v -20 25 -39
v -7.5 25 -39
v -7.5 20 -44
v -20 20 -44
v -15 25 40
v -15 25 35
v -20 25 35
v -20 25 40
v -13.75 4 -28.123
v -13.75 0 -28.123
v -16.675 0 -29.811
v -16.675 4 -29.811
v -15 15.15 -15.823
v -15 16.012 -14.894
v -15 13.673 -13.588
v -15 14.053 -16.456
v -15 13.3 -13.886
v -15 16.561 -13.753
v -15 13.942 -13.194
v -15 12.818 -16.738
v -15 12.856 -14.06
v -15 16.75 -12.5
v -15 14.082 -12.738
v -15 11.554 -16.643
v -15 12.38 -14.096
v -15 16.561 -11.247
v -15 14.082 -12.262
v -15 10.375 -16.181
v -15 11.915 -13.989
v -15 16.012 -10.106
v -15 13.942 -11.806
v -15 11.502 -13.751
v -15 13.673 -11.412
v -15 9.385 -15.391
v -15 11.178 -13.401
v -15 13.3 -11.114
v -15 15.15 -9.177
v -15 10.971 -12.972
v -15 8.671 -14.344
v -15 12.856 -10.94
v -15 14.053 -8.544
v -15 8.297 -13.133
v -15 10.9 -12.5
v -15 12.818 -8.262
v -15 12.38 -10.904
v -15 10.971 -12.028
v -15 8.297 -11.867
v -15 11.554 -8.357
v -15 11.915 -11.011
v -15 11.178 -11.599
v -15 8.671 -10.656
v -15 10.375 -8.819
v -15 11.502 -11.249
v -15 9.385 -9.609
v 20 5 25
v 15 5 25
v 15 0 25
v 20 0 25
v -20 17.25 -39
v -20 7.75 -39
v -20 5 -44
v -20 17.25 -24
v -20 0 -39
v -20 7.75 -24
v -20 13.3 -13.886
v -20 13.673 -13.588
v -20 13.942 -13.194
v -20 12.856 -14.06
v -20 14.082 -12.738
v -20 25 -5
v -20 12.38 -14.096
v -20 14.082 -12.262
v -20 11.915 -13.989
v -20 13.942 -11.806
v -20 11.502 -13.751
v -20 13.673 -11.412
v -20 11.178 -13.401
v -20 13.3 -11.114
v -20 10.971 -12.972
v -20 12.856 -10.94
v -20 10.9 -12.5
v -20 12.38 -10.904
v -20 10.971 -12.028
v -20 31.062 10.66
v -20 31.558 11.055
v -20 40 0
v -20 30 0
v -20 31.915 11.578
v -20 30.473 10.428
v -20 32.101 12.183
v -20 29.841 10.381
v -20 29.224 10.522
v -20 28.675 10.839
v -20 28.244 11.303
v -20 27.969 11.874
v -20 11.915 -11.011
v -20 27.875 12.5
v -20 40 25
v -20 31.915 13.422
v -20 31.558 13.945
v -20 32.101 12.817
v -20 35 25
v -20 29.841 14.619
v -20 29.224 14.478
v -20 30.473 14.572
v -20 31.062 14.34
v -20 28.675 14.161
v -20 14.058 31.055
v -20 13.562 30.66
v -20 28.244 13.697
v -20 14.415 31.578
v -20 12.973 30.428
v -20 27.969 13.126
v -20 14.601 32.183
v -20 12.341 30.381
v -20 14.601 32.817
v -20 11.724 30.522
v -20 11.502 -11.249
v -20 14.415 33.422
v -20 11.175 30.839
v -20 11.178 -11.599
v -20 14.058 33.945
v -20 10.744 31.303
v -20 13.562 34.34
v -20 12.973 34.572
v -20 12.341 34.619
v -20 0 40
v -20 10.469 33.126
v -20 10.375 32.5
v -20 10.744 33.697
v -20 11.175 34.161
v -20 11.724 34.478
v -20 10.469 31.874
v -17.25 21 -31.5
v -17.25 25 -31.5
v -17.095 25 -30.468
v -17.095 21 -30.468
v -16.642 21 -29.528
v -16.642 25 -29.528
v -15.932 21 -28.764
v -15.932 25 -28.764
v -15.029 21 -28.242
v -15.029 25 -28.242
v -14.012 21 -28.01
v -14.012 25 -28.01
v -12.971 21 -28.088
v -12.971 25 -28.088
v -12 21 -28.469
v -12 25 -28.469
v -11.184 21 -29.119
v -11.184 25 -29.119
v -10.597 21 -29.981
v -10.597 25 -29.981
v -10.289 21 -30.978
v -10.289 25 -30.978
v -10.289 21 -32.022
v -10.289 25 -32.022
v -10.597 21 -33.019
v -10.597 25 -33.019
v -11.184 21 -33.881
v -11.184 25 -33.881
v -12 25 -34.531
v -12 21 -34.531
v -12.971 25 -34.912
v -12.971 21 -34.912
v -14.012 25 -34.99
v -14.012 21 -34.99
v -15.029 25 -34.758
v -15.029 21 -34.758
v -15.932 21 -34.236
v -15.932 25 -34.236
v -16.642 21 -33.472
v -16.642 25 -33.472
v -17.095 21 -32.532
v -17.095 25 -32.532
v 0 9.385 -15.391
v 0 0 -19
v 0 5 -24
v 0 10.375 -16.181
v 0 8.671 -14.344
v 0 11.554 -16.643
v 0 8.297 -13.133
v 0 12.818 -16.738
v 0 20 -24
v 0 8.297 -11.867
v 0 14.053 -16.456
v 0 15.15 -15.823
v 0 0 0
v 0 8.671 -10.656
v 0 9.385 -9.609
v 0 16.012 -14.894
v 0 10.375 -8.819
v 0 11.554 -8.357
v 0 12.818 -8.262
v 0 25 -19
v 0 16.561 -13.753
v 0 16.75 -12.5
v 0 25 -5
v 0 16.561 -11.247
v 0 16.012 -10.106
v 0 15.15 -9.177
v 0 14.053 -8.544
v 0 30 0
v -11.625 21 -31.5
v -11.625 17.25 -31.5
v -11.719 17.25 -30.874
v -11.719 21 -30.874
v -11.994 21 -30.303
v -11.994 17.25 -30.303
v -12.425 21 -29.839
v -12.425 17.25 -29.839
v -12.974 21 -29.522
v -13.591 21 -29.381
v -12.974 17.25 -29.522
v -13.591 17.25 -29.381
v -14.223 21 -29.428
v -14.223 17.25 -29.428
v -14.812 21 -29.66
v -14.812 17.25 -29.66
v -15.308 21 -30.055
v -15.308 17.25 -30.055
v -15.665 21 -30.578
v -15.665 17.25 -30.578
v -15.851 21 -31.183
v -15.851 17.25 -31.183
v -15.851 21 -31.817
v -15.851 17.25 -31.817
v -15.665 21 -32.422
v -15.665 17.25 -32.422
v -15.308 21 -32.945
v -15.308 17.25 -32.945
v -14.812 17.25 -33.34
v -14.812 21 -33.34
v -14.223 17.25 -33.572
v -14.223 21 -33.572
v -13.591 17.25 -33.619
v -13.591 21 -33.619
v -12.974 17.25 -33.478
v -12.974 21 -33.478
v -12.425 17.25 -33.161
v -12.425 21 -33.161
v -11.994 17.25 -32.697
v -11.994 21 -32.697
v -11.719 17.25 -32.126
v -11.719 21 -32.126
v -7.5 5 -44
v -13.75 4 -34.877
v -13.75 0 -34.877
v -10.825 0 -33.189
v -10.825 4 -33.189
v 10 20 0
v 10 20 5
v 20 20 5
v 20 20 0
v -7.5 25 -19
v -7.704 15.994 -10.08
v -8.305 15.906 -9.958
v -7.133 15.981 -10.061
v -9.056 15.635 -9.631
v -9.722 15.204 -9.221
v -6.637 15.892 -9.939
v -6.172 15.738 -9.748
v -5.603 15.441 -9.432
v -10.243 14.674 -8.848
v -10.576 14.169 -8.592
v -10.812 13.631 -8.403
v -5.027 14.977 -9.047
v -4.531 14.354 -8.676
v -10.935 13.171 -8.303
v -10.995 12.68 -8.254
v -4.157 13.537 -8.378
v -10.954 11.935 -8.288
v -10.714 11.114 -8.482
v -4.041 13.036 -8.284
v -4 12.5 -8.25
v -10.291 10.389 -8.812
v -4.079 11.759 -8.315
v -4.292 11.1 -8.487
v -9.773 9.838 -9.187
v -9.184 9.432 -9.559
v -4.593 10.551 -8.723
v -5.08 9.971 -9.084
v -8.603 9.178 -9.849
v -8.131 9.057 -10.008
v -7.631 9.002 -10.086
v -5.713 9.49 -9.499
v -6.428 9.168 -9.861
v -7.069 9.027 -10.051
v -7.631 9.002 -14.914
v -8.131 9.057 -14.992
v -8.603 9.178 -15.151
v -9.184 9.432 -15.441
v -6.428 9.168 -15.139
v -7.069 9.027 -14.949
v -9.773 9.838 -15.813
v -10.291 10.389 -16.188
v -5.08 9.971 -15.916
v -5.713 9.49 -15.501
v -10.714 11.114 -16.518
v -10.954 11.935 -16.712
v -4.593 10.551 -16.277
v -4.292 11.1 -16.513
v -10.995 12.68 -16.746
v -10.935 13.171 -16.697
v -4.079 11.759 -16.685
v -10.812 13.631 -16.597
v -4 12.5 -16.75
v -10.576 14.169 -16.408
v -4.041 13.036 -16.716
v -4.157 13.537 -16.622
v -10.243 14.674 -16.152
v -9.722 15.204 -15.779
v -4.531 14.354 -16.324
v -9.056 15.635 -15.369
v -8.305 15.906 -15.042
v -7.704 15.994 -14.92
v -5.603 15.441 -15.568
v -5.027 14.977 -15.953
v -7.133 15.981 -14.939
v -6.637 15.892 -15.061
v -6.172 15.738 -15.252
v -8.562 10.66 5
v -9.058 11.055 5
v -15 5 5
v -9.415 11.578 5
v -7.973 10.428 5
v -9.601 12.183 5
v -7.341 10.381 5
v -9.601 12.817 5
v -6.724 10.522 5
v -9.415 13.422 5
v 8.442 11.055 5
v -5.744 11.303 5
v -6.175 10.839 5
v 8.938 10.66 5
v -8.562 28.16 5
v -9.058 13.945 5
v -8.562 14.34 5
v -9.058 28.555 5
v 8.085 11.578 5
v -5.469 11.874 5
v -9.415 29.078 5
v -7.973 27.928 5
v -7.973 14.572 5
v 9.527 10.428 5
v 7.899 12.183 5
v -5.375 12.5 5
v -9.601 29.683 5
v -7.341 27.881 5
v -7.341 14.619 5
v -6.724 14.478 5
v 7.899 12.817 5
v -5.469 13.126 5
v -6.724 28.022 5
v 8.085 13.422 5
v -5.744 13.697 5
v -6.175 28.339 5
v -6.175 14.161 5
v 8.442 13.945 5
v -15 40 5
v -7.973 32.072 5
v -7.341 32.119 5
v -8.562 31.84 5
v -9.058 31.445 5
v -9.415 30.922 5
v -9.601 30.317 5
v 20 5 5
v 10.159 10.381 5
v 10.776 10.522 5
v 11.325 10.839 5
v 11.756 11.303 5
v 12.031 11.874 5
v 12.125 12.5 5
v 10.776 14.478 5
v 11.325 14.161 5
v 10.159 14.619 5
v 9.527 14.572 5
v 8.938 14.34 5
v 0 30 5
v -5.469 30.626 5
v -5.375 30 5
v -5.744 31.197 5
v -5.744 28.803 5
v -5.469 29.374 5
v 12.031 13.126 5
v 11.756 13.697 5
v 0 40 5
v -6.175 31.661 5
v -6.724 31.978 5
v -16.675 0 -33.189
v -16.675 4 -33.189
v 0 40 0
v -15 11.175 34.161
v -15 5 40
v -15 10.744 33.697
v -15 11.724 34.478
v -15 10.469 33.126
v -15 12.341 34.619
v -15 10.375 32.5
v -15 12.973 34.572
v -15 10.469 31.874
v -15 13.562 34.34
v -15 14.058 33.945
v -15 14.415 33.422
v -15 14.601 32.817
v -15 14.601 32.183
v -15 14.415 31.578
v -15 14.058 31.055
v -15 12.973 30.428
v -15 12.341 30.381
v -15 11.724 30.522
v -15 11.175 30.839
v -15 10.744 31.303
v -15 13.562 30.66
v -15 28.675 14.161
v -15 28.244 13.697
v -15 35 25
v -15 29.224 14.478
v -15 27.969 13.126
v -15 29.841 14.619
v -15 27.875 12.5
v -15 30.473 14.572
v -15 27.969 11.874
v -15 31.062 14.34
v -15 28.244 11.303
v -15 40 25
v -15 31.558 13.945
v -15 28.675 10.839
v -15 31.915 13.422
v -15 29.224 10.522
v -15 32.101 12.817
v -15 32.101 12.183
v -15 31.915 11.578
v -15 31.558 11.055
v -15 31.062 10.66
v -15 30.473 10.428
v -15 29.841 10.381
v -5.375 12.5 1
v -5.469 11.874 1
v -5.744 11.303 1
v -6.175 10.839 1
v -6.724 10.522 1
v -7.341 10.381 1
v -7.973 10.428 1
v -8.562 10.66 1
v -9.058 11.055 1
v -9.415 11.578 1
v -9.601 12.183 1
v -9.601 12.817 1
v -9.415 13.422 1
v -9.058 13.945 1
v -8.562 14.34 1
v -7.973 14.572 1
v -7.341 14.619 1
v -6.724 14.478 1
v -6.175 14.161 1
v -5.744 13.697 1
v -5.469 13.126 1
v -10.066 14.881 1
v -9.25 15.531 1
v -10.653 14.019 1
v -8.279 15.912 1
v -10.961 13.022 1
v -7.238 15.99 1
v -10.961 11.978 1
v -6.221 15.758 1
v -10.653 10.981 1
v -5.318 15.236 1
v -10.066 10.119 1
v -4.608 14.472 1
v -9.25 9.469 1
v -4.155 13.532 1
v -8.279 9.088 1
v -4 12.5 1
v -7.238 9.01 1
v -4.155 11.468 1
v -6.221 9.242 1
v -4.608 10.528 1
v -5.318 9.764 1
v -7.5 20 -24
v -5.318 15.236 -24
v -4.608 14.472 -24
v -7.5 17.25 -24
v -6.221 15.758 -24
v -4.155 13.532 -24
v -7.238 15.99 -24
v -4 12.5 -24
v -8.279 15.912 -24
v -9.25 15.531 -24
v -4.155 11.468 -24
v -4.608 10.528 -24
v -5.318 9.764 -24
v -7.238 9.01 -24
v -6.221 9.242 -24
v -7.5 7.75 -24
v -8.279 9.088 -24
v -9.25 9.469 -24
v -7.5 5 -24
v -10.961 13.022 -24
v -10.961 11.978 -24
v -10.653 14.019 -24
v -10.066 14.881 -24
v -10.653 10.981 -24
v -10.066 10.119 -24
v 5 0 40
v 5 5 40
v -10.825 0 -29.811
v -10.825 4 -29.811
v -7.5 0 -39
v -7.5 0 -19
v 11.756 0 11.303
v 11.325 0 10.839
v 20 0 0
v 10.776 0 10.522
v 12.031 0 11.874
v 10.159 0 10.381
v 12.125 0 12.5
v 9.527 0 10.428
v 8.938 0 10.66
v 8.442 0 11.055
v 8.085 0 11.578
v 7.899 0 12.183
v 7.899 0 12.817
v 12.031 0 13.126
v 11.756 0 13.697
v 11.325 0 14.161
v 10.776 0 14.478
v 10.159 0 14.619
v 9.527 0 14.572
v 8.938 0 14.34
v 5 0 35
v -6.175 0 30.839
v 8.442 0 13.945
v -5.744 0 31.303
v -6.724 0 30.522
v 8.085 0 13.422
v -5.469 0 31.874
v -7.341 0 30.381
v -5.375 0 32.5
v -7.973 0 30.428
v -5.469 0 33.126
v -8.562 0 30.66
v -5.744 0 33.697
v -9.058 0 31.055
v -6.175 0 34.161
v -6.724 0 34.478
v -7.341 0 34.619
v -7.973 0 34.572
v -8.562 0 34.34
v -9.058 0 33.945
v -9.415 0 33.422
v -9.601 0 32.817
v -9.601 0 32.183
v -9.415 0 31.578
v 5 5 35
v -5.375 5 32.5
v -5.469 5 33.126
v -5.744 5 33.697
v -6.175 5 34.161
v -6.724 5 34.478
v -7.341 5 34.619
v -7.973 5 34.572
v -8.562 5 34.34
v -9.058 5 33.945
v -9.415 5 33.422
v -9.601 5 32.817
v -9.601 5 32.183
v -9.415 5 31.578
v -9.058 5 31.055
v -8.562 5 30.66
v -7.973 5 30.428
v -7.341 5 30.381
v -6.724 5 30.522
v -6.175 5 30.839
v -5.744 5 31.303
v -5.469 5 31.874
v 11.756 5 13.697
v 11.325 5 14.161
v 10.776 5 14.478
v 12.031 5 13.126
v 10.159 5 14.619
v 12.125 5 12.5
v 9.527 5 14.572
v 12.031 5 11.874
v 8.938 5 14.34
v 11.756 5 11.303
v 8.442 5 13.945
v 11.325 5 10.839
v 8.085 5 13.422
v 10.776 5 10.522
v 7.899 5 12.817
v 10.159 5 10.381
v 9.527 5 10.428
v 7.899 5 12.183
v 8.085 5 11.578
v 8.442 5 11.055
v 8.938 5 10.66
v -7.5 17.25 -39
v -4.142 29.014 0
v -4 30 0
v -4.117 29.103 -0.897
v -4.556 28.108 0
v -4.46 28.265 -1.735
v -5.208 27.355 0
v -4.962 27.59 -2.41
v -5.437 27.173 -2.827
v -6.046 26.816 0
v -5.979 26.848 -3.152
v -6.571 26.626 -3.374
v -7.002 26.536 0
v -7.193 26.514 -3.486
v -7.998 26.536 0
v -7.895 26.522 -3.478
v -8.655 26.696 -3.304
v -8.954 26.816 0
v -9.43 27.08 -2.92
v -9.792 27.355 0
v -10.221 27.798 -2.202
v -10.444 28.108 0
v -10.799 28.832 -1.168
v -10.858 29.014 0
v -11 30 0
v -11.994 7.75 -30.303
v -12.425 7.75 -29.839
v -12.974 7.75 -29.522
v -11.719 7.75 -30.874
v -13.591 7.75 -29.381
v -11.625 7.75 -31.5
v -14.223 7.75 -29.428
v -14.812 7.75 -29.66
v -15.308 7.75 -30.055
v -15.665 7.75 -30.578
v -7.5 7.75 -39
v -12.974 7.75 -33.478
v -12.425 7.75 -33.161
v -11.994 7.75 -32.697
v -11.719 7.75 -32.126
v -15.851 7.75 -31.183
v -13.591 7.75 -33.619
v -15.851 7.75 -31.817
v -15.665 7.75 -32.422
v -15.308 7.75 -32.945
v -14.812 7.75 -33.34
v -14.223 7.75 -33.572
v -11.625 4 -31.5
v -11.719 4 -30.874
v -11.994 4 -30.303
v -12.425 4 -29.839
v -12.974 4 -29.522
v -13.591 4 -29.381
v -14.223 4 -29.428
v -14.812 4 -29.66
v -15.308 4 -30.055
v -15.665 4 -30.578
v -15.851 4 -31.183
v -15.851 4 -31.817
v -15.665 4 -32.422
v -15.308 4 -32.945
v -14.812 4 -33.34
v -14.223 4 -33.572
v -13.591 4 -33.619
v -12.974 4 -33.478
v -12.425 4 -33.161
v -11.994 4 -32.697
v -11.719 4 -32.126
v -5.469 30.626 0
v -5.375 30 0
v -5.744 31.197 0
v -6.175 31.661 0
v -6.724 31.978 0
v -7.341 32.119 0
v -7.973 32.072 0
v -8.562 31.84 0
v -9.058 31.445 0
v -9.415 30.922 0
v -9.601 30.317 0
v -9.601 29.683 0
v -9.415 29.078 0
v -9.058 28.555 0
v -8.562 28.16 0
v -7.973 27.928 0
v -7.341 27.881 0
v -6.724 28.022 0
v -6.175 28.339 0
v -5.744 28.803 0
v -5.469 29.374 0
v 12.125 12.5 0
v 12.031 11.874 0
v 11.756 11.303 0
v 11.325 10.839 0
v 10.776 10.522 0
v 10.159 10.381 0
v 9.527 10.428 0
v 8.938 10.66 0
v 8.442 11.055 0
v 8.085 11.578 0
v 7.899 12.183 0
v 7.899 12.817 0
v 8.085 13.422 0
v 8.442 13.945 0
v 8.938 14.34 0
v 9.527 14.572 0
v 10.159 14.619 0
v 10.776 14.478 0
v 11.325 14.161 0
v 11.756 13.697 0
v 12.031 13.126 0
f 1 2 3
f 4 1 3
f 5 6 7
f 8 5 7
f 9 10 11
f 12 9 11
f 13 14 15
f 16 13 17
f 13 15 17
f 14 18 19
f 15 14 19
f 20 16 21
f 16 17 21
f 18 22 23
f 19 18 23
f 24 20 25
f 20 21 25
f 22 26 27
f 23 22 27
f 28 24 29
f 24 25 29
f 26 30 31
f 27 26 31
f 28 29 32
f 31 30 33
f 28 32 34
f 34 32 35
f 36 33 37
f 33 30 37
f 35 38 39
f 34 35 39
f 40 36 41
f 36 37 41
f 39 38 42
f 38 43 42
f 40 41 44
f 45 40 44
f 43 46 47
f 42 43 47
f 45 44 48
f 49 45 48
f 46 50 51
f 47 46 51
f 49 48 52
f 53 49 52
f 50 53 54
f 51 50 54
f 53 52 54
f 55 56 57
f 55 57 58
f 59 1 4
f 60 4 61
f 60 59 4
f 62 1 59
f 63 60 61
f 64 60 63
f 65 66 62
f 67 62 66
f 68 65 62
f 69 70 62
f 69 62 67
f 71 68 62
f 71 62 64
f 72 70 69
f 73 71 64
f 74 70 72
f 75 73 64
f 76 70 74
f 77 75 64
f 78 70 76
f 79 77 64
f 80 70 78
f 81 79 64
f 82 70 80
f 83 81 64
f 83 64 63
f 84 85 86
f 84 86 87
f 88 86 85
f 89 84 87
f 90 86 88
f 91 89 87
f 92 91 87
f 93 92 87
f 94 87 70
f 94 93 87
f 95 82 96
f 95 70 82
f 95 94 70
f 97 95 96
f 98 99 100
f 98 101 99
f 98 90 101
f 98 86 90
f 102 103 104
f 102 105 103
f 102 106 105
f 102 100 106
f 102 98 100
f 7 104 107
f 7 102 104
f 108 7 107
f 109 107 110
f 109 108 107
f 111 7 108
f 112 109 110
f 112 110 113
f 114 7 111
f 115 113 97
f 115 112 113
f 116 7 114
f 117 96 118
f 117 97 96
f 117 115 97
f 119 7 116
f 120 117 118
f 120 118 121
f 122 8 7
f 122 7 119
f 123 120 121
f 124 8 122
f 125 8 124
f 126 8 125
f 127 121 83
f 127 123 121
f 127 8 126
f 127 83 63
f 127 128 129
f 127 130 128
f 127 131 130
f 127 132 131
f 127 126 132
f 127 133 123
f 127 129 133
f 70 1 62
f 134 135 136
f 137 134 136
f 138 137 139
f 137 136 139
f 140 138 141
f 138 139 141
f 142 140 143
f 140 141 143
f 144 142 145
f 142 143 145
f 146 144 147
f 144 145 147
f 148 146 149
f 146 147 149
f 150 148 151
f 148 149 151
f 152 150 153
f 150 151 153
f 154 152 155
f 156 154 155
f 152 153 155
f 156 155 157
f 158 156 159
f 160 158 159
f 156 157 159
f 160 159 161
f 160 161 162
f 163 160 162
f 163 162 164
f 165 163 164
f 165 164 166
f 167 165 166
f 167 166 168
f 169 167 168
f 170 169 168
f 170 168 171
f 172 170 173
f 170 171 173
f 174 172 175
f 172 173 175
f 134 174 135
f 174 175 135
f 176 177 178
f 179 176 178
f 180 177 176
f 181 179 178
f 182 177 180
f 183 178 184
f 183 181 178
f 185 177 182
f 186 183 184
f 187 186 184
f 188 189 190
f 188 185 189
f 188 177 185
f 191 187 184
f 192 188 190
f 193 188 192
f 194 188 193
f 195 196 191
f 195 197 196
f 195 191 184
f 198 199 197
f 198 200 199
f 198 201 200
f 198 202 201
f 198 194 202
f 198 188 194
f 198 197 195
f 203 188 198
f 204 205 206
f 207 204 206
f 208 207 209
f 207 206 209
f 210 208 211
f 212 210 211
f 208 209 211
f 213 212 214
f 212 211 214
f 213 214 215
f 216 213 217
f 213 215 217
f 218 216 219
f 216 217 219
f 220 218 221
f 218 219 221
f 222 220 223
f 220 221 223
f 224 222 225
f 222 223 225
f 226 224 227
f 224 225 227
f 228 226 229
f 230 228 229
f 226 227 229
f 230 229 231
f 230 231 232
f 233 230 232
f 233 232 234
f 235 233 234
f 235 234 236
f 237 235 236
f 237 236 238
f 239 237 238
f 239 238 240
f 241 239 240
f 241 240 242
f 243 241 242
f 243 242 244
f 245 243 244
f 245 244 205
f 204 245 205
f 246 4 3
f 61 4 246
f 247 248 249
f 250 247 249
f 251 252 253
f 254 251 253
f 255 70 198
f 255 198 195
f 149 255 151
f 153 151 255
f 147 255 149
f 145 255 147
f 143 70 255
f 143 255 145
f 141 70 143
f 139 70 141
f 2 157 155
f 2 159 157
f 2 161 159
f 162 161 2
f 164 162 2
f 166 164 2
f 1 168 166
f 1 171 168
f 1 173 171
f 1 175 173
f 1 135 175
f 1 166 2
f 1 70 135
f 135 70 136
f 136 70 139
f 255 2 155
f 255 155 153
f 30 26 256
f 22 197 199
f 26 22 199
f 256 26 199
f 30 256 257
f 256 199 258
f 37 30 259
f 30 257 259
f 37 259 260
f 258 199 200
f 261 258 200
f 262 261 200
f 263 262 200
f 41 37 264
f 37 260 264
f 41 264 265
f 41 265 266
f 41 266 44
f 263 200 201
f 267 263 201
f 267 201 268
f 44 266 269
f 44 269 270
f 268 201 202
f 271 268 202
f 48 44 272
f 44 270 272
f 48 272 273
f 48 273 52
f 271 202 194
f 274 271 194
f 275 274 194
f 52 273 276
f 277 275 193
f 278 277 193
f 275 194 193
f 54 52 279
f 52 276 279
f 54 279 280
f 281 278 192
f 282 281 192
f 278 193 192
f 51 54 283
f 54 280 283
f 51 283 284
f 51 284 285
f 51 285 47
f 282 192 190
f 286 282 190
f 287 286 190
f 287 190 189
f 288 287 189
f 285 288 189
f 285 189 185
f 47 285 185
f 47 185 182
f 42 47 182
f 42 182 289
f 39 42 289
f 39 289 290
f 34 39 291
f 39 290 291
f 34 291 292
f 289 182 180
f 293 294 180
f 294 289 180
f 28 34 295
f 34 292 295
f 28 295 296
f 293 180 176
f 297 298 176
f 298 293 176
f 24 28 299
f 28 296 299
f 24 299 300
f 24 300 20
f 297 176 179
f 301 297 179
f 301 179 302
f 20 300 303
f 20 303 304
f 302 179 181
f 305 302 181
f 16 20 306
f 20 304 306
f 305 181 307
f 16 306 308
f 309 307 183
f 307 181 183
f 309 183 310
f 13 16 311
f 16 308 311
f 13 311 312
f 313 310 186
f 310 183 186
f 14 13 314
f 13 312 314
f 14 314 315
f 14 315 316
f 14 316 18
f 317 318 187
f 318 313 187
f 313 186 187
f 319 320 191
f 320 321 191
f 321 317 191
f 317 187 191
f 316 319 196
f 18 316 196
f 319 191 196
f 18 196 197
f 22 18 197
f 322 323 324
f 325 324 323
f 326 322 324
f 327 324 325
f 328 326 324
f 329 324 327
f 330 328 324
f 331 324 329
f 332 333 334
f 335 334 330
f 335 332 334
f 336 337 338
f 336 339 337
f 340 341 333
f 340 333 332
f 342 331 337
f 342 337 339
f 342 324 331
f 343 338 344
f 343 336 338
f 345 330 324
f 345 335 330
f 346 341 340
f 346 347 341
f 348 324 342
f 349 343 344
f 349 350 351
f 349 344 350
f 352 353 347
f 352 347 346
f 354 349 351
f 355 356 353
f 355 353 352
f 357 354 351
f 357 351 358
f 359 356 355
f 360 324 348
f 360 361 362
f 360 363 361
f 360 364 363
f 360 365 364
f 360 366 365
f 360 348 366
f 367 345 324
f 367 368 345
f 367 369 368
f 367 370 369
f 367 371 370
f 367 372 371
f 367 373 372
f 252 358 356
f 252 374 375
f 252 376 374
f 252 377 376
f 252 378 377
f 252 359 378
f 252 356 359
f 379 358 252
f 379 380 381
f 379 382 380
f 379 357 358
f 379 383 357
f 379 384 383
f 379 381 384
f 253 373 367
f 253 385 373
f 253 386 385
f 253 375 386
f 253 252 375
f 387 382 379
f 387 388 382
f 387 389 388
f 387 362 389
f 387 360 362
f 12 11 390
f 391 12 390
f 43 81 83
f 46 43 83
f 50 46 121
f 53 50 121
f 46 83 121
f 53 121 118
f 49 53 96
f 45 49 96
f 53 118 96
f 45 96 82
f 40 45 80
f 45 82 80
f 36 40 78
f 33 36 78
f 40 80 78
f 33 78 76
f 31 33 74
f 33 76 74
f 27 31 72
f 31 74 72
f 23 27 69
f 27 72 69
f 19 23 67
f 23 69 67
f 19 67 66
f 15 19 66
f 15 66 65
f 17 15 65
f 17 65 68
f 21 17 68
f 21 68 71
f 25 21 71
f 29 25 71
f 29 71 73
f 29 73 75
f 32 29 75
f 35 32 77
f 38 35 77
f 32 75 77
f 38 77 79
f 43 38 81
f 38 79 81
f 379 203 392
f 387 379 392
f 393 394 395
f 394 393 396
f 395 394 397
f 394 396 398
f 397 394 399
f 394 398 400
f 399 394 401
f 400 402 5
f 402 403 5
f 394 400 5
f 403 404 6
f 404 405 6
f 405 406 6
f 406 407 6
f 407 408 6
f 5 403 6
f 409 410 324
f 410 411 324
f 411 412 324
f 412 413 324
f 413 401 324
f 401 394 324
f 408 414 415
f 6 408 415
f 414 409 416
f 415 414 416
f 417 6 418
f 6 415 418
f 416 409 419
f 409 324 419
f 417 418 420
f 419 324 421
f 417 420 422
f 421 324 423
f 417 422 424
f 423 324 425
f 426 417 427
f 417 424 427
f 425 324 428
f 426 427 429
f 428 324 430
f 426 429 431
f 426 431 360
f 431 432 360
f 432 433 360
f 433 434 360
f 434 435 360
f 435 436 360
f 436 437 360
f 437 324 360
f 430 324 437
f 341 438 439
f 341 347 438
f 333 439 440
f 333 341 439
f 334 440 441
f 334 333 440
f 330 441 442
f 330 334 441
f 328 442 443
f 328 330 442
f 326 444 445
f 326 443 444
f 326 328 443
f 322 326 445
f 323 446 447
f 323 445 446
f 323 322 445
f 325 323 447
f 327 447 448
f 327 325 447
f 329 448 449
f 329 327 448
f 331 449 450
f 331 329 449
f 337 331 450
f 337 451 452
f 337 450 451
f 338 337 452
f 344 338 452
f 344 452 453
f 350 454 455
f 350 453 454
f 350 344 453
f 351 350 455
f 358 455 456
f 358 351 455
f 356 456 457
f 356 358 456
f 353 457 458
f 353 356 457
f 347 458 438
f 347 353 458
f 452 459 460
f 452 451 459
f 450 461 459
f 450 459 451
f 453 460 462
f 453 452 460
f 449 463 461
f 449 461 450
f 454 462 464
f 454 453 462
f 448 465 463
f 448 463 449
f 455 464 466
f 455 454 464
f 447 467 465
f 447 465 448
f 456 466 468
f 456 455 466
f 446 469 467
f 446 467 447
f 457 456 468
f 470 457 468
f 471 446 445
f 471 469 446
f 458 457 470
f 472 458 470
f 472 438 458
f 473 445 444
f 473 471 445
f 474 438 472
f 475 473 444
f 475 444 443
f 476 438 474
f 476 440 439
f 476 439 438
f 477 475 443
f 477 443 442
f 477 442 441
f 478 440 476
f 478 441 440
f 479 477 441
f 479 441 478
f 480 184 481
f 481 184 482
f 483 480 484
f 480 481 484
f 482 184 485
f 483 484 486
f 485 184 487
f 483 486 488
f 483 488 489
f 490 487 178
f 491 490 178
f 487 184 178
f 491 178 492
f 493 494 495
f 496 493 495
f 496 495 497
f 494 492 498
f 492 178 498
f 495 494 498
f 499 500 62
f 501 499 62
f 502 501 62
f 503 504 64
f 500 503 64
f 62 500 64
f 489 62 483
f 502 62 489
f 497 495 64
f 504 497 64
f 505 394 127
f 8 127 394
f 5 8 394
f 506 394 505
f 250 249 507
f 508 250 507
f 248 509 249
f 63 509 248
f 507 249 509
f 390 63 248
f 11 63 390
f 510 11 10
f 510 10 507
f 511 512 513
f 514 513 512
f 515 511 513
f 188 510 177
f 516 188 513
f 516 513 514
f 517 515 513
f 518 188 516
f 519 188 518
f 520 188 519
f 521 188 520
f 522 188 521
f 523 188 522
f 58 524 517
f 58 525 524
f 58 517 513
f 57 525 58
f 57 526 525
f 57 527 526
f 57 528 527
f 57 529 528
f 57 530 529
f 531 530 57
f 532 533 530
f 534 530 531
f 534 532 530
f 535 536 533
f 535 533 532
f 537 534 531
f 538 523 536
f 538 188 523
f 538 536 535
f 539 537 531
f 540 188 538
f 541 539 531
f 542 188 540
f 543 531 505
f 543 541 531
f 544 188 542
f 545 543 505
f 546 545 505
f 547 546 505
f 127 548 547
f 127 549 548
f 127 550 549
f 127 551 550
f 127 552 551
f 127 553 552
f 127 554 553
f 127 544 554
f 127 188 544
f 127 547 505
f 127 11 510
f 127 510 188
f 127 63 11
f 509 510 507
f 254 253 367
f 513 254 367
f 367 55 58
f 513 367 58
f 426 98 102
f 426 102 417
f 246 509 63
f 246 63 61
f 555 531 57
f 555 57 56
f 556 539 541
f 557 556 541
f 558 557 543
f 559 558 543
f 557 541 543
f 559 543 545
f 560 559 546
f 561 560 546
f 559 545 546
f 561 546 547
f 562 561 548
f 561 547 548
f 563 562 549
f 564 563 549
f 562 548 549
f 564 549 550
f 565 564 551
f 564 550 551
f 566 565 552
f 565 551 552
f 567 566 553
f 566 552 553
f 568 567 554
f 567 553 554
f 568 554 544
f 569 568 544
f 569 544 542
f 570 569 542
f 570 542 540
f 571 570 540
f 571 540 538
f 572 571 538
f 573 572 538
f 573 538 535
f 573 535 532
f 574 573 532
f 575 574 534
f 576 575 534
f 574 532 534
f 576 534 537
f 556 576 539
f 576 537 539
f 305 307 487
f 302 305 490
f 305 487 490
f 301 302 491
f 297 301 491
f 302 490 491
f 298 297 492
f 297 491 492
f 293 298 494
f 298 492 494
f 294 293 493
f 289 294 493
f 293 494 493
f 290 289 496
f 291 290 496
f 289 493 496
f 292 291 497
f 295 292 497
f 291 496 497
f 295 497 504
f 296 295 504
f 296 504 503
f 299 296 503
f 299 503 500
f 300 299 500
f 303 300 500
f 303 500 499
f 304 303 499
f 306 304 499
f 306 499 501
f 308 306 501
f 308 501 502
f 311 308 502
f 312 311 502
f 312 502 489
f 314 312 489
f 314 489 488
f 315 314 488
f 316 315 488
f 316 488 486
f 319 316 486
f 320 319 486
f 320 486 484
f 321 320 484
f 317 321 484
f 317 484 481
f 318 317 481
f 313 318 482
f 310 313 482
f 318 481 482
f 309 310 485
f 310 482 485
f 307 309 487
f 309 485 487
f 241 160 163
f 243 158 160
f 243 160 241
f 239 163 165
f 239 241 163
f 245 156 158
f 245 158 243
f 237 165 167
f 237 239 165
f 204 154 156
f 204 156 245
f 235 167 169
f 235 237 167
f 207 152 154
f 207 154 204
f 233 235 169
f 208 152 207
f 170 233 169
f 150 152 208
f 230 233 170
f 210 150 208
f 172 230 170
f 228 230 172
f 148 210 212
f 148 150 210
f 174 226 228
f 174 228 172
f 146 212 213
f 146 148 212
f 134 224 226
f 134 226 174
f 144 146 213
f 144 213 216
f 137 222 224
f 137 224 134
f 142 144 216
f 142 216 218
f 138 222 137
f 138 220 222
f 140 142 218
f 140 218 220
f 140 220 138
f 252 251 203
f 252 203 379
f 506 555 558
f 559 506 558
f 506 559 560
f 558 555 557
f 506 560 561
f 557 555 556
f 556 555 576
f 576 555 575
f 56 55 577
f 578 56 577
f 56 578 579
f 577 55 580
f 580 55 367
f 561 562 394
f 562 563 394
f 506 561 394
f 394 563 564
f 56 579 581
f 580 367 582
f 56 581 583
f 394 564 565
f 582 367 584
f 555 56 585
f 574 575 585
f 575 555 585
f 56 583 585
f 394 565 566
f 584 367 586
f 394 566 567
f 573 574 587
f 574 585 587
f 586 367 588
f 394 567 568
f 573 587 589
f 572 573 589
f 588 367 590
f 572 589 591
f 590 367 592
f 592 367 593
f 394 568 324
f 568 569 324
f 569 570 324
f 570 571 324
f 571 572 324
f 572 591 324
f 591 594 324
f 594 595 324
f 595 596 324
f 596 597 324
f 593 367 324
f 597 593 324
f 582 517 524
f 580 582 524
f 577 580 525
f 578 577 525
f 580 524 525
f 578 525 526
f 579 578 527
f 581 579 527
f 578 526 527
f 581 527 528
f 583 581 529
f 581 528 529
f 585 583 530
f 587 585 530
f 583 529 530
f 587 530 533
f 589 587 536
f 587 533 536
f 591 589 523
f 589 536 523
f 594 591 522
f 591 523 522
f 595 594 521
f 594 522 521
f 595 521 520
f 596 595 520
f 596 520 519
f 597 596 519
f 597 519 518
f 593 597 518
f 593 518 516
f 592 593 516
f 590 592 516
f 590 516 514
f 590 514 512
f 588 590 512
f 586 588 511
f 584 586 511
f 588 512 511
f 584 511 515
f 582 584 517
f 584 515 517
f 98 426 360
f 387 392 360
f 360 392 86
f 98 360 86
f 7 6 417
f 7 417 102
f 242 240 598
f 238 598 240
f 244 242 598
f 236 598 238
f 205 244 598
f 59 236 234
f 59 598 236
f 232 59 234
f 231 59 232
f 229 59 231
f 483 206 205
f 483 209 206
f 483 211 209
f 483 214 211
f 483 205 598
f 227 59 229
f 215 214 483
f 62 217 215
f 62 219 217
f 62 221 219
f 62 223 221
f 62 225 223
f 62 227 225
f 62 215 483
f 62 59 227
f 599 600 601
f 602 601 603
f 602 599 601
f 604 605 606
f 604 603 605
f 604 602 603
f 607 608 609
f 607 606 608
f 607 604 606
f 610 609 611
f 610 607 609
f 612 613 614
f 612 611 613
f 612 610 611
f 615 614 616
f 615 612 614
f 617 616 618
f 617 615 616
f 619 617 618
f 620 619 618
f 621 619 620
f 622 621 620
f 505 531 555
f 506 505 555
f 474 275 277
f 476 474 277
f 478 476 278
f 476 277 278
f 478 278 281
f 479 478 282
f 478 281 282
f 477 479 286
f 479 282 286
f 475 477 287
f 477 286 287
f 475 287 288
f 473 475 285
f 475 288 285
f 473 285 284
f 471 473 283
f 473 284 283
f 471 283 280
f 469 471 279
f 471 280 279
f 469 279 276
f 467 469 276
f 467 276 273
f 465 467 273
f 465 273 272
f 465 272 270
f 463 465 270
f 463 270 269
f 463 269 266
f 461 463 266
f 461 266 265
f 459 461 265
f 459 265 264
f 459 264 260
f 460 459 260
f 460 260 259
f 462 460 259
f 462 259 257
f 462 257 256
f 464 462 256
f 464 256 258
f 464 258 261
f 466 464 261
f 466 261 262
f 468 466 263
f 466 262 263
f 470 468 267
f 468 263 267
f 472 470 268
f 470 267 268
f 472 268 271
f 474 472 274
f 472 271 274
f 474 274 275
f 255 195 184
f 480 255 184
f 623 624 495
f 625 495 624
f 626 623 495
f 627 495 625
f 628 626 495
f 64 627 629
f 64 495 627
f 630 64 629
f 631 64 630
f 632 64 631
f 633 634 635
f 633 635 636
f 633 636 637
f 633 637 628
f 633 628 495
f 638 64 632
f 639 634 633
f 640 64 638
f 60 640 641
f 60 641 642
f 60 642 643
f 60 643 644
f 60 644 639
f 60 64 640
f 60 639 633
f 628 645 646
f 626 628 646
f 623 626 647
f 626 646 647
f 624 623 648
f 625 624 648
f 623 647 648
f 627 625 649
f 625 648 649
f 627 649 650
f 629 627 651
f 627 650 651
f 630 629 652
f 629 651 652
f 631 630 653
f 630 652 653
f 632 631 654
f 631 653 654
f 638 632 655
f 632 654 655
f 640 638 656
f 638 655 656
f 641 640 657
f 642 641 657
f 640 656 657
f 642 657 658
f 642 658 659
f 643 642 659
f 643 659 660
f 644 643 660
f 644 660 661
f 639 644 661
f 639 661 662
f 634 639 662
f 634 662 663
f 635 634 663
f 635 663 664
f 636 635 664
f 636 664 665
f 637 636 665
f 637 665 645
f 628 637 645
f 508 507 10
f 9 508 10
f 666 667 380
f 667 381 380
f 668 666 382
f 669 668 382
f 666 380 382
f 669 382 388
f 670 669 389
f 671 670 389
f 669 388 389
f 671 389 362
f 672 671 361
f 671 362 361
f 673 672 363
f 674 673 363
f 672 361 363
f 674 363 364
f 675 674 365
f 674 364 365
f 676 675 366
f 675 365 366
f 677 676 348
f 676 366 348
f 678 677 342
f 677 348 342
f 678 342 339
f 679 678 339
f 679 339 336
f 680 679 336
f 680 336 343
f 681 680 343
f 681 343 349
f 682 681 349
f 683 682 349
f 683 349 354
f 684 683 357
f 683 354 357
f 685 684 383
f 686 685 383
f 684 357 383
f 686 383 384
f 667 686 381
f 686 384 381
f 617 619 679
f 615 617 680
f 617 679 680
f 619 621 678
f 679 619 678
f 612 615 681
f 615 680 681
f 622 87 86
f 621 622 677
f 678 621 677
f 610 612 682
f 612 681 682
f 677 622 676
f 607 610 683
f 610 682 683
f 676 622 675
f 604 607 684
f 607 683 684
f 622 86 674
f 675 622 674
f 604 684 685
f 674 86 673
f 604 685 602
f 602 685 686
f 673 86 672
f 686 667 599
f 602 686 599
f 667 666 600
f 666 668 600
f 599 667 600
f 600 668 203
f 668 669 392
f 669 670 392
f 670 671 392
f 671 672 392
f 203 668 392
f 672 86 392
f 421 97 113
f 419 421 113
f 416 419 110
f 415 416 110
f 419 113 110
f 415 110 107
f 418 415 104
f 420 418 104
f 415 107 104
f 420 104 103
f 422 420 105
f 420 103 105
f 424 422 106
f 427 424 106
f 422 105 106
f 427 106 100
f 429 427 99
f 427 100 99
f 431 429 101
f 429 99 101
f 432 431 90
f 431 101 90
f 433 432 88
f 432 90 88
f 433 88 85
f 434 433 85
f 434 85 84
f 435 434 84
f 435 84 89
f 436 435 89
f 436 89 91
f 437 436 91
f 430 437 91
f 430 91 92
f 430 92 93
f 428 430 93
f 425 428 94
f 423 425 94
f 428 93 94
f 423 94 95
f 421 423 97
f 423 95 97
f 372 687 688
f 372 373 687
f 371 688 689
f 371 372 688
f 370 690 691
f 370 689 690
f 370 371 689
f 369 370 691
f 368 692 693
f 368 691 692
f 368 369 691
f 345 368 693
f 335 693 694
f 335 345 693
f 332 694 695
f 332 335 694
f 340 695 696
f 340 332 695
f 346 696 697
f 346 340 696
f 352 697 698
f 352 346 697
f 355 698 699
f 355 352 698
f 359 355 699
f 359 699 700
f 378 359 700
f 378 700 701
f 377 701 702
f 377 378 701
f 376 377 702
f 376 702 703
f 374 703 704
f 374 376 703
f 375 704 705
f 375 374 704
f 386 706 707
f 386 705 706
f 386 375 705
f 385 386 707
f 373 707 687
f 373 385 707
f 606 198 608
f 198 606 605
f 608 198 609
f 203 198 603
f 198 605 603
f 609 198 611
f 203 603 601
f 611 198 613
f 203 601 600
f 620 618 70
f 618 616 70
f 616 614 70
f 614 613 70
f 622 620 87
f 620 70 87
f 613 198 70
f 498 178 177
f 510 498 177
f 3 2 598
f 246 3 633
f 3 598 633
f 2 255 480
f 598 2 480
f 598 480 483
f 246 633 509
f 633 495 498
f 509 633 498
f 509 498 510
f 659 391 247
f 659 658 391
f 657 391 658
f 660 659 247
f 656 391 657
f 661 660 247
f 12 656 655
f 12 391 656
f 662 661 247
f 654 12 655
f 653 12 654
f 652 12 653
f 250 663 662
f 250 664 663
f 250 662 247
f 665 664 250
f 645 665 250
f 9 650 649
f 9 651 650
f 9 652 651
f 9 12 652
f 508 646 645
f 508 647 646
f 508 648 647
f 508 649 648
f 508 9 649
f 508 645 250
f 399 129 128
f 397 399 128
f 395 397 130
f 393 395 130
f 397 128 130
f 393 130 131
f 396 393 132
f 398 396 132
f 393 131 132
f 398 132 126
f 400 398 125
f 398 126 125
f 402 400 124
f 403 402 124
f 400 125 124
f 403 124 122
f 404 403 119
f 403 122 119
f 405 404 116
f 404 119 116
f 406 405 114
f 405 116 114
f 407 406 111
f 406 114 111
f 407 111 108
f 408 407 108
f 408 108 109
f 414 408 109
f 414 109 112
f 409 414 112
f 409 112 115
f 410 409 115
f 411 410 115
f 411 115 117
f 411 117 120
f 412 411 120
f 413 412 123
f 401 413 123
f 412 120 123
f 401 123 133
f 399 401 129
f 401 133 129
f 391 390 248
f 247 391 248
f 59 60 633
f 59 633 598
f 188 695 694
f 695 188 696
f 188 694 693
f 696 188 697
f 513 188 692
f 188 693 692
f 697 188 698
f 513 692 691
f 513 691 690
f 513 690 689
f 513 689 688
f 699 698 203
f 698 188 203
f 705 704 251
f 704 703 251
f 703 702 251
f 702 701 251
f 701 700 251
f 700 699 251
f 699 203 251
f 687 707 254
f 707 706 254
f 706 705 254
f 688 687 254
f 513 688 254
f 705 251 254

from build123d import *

# Parameters (mm, degrees)
F0_R         = 2.125
F1_DEPTH     = 5
F3_DEPTH     = 20
F5_DEPTH     = 15
F6_SIZE      = 10
F7_R         = 2.125
F8_DEPTH     = 5
F9_R         = 2.125
F10_DEPTH    = 5
F11_W        = 40
F11_H        = 20
F11_R        = 2.125
F12_DEPTH    = 24
F14_DEPTH    = 25
F15_R        = 4.25
F16_DEPTH    = 20
F17_R        = 3.5
F18_DEPTH    = 25
F19_W        = 20
F19_H        = 24
F20_DEPTH    = 5
F22_DEPTH    = 12.5
F23_T4_DEPTH = 20
F23_S5_R     = 2.125
F23_T6_DEPTH = 12
F23_T7_DEPTH = 38.2168298797
F23_T9_DEPTH = 20.3584149398
F24_R        = 3.5
F25_DEPTH    = 44.001
F26_R        = 4.25
F26_R_2      = 1.6
F27_DEPTH    = 5
F28_R        = 2.125
F29_DEPTH    = 40.001
F31_DEPTH    = 4
F32_R        = 3.5
F33_DEPTH    = 4


# Not quite as in the source:
# - a fillet or chamfer that OpenCascade refuses, or shapes differently, is made with other operations: its cross-section is extruded or revolved along the edge and cut away or added


with BuildPart() as f1:
    # F0 (on Top) → F1 (new body)
    with BuildSketch(Plane.XY):
        Polygon((0, 20), (0, 40), (-20, 40), (-20, 0), (20, 0), (20, 20), align=None)
        with Locations((-7.5, 12.5)):
            Circle(F0_R, mode=Mode.SUBTRACT)
        with Locations((10, 12.5)):
            Circle(F0_R, mode=Mode.SUBTRACT)
        with Locations((-7.5, 30)):
            Circle(F0_R, mode=Mode.SUBTRACT)
    extrude(amount=F1_DEPTH)

    # F2 (on face) → F3 (join)
    with BuildSketch(Plane.XY.offset(5)):
        Polygon((-15, 40), (-20, 40), (-20, 0), (20, 0), (20, 5), (-15, 5), align=None)
    extrude(amount=F3_DEPTH)

    # F4 (on face) → F5 (join)
    with BuildSketch(Plane.XY.offset(25)):
        Polygon((-15, 5), (-15, 25), (-20, 25), (-20, 0), (5, 0), (5, 5), align=None)
    extrude(amount=F5_DEPTH)

    # F6
    f6_edges = [f1.edges().sort_by_distance(p)[0] for p in [
        (0, 20, 2.5),
        (-17.5, 25, 25),
        (5, 2.5, 25),
    ]]
    chamfer(f6_edges, length=F6_SIZE)

    # F7 (on face) → F8 (cut)
    with BuildSketch(Plane.XZ):
        with Locations((-7.5, 32.5)):
            Circle(F7_R)
        with Locations((10, 12.5)):
            Circle(F7_R)
    extrude(amount=-F8_DEPTH, mode=Mode.SUBTRACT)

    # F9 (on face) → F10 (cut)
    with BuildSketch(Plane(origin=(-20, 0, 0), x_dir=(0, -1, 0), z_dir=(-1, 0, 0))):
        with Locations((-12.5, 32.5)):
            Circle(F9_R)
        with Locations((-30, 12.5)):
            Circle(F9_R)
    extrude(amount=-F10_DEPTH, mode=Mode.SUBTRACT)

    # F11 (on face) → F12 (join)
    with BuildSketch(Plane(origin=(0, 0, 0), x_dir=(1, 0, 0), z_dir=(0, 0, -1))):
        with Locations((0, -10)):
            Rectangle(F11_W, F11_H)
        with Locations((-7.5, -12.5)):
            Circle(F11_R, mode=Mode.SUBTRACT)
        with Locations((10, -12.5)):
            Circle(F11_R, mode=Mode.SUBTRACT)
    extrude(amount=F12_DEPTH)

    # F13 (on face) → F14 (cut)
    with BuildSketch(Plane(origin=(0, 20, 0), x_dir=(-1, 0, 0), z_dir=(0, 1, 0))):
        Polygon((0, -24), (0, -11.5), (0, 0), (-20, 0), (-20, -24), align=None)
    extrude(amount=-F14_DEPTH, mode=Mode.SUBTRACT)

    # F15 (on face) → F16 (cut)
    with BuildSketch(Plane.YZ):
        with Locations((12.5, -12.5)):
            Circle(F15_R)
    extrude(amount=-F16_DEPTH, mode=Mode.SUBTRACT)

    # F17 (on face) → F18 (cut)
    with BuildSketch(Plane(origin=(0, 0, -24), x_dir=(1, 0, 0), z_dir=(0, 0, -1))):
        with Locations((-7.5, -12.5)):
            Circle(F17_R)
    extrude(amount=-F18_DEPTH, mode=Mode.SUBTRACT)

    # F19 (on face) → F20 (join)
    with BuildSketch(Plane(origin=(0, 20, 0), x_dir=(-1, 0, 0), z_dir=(0, 1, 0))):
        with Locations((10, -12)):
            Rectangle(F19_W, F19_H)
    extrude(amount=F20_DEPTH)

    # F21 (on face) → F22 (join)
    with BuildSketch(Plane(origin=(-20, 0, 0), x_dir=(0, -1, 0), z_dir=(-1, 0, 0))):
        Polygon((-17.25, -24), (-25, -24), (-25, -44), (0, -44), (0, -24), (-7.75, -24), (-7.75, -39), (-17.25, -39), align=None)
    extrude(amount=-F22_DEPTH)

    # F23: chamfer of 5 on 5 edges, made by hand


with BuildPart() as f23_tool2:
    # F23_s3 → F23_t4 (new body)
    with BuildSketch(Plane.YZ.offset(-20)):
        Polygon((25, -5), (30, 0), (25, 0), align=None)
    extrude(amount=F23_T4_DEPTH)

    # F23_s5 → F23_t6 (cut, symmetric)
    with BuildSketch(Plane.XY.offset(-2.5)):
        with Locations((-7.5, 30)):
            Circle(F23_S5_R)
    extrude(amount=F23_T6_DEPTH, both=True, mode=Mode.SUBTRACT)


with BuildPart() as f1_1:
    add(f1.part)

    # F23_t1: union F23_tool2
    add(f23_tool2.part)

    # F23_s8 → F23_t7 (cut)
    with BuildSketch(Plane.YZ.offset(-32.8584149398)):
        Polygon((25, -39), (20, -44), (25, -44), align=None)
        Polygon((0, -39), (5, -44), (0, -44), align=None)
    extrude(amount=F23_T7_DEPTH, mode=Mode.SUBTRACT)

    # F23_s10 → F23_t9 (cut)
    with BuildSketch(Plane.YZ.offset(-7.5)):
        Polygon((5, -24), (0, -19), (0, -24), align=None)
        Polygon((25, -19), (20, -24), (25, -24), align=None)
    extrude(amount=F23_T9_DEPTH, mode=Mode.SUBTRACT)

    # F24 (on face) → F25 (cut, through all)
    with BuildSketch(Plane(origin=(0, 0, 0), x_dir=(1, 0, 0), z_dir=(0, 0, -1))):
        with Locations((-7.5, -30)):
            Circle(F24_R)
    extrude(amount=F25_DEPTH, mode=Mode.SUBTRACT)

    # F26 (on face) → F27 (join)
    with BuildSketch(Plane(origin=(-20, 0, 0), x_dir=(0, -1, 0), z_dir=(-1, 0, 0))):
        with Locations((-12.5, -12.5)):
            Circle(F26_R)
        with Locations((-12.5, -12.5)):
            Circle(F26_R_2, mode=Mode.SUBTRACT)
    extrude(amount=-F27_DEPTH)

    # F28 (on face) → F29 (cut, through all)
    with BuildSketch(Plane.XZ):
        with Locations((-13.75, -31.5)):
            Circle(F28_R)
    extrude(amount=-F29_DEPTH, mode=Mode.SUBTRACT)

    # F30 (on face) → F31 (cut)
    with BuildSketch(Plane.XZ):
        Polygon((-10.825, -33.1887495374), (-10.825, -29.8112504626), (-13.75, -28.1225009252), (-16.675, -29.8112504626), (-16.675, -33.1887495374), (-13.75, -34.8774990748), align=None)
    extrude(amount=-F31_DEPTH, mode=Mode.SUBTRACT)

    # F32 (on face) → F33 (cut)
    with BuildSketch(Plane(origin=(0, 25, 0), x_dir=(-1, 0, 0), z_dir=(0, 1, 0))):
        with Locations((13.75, -31.5)):
            Circle(F32_R)
    extrude(amount=-F33_DEPTH, mode=Mode.SUBTRACT)


solid = f1_1.part
